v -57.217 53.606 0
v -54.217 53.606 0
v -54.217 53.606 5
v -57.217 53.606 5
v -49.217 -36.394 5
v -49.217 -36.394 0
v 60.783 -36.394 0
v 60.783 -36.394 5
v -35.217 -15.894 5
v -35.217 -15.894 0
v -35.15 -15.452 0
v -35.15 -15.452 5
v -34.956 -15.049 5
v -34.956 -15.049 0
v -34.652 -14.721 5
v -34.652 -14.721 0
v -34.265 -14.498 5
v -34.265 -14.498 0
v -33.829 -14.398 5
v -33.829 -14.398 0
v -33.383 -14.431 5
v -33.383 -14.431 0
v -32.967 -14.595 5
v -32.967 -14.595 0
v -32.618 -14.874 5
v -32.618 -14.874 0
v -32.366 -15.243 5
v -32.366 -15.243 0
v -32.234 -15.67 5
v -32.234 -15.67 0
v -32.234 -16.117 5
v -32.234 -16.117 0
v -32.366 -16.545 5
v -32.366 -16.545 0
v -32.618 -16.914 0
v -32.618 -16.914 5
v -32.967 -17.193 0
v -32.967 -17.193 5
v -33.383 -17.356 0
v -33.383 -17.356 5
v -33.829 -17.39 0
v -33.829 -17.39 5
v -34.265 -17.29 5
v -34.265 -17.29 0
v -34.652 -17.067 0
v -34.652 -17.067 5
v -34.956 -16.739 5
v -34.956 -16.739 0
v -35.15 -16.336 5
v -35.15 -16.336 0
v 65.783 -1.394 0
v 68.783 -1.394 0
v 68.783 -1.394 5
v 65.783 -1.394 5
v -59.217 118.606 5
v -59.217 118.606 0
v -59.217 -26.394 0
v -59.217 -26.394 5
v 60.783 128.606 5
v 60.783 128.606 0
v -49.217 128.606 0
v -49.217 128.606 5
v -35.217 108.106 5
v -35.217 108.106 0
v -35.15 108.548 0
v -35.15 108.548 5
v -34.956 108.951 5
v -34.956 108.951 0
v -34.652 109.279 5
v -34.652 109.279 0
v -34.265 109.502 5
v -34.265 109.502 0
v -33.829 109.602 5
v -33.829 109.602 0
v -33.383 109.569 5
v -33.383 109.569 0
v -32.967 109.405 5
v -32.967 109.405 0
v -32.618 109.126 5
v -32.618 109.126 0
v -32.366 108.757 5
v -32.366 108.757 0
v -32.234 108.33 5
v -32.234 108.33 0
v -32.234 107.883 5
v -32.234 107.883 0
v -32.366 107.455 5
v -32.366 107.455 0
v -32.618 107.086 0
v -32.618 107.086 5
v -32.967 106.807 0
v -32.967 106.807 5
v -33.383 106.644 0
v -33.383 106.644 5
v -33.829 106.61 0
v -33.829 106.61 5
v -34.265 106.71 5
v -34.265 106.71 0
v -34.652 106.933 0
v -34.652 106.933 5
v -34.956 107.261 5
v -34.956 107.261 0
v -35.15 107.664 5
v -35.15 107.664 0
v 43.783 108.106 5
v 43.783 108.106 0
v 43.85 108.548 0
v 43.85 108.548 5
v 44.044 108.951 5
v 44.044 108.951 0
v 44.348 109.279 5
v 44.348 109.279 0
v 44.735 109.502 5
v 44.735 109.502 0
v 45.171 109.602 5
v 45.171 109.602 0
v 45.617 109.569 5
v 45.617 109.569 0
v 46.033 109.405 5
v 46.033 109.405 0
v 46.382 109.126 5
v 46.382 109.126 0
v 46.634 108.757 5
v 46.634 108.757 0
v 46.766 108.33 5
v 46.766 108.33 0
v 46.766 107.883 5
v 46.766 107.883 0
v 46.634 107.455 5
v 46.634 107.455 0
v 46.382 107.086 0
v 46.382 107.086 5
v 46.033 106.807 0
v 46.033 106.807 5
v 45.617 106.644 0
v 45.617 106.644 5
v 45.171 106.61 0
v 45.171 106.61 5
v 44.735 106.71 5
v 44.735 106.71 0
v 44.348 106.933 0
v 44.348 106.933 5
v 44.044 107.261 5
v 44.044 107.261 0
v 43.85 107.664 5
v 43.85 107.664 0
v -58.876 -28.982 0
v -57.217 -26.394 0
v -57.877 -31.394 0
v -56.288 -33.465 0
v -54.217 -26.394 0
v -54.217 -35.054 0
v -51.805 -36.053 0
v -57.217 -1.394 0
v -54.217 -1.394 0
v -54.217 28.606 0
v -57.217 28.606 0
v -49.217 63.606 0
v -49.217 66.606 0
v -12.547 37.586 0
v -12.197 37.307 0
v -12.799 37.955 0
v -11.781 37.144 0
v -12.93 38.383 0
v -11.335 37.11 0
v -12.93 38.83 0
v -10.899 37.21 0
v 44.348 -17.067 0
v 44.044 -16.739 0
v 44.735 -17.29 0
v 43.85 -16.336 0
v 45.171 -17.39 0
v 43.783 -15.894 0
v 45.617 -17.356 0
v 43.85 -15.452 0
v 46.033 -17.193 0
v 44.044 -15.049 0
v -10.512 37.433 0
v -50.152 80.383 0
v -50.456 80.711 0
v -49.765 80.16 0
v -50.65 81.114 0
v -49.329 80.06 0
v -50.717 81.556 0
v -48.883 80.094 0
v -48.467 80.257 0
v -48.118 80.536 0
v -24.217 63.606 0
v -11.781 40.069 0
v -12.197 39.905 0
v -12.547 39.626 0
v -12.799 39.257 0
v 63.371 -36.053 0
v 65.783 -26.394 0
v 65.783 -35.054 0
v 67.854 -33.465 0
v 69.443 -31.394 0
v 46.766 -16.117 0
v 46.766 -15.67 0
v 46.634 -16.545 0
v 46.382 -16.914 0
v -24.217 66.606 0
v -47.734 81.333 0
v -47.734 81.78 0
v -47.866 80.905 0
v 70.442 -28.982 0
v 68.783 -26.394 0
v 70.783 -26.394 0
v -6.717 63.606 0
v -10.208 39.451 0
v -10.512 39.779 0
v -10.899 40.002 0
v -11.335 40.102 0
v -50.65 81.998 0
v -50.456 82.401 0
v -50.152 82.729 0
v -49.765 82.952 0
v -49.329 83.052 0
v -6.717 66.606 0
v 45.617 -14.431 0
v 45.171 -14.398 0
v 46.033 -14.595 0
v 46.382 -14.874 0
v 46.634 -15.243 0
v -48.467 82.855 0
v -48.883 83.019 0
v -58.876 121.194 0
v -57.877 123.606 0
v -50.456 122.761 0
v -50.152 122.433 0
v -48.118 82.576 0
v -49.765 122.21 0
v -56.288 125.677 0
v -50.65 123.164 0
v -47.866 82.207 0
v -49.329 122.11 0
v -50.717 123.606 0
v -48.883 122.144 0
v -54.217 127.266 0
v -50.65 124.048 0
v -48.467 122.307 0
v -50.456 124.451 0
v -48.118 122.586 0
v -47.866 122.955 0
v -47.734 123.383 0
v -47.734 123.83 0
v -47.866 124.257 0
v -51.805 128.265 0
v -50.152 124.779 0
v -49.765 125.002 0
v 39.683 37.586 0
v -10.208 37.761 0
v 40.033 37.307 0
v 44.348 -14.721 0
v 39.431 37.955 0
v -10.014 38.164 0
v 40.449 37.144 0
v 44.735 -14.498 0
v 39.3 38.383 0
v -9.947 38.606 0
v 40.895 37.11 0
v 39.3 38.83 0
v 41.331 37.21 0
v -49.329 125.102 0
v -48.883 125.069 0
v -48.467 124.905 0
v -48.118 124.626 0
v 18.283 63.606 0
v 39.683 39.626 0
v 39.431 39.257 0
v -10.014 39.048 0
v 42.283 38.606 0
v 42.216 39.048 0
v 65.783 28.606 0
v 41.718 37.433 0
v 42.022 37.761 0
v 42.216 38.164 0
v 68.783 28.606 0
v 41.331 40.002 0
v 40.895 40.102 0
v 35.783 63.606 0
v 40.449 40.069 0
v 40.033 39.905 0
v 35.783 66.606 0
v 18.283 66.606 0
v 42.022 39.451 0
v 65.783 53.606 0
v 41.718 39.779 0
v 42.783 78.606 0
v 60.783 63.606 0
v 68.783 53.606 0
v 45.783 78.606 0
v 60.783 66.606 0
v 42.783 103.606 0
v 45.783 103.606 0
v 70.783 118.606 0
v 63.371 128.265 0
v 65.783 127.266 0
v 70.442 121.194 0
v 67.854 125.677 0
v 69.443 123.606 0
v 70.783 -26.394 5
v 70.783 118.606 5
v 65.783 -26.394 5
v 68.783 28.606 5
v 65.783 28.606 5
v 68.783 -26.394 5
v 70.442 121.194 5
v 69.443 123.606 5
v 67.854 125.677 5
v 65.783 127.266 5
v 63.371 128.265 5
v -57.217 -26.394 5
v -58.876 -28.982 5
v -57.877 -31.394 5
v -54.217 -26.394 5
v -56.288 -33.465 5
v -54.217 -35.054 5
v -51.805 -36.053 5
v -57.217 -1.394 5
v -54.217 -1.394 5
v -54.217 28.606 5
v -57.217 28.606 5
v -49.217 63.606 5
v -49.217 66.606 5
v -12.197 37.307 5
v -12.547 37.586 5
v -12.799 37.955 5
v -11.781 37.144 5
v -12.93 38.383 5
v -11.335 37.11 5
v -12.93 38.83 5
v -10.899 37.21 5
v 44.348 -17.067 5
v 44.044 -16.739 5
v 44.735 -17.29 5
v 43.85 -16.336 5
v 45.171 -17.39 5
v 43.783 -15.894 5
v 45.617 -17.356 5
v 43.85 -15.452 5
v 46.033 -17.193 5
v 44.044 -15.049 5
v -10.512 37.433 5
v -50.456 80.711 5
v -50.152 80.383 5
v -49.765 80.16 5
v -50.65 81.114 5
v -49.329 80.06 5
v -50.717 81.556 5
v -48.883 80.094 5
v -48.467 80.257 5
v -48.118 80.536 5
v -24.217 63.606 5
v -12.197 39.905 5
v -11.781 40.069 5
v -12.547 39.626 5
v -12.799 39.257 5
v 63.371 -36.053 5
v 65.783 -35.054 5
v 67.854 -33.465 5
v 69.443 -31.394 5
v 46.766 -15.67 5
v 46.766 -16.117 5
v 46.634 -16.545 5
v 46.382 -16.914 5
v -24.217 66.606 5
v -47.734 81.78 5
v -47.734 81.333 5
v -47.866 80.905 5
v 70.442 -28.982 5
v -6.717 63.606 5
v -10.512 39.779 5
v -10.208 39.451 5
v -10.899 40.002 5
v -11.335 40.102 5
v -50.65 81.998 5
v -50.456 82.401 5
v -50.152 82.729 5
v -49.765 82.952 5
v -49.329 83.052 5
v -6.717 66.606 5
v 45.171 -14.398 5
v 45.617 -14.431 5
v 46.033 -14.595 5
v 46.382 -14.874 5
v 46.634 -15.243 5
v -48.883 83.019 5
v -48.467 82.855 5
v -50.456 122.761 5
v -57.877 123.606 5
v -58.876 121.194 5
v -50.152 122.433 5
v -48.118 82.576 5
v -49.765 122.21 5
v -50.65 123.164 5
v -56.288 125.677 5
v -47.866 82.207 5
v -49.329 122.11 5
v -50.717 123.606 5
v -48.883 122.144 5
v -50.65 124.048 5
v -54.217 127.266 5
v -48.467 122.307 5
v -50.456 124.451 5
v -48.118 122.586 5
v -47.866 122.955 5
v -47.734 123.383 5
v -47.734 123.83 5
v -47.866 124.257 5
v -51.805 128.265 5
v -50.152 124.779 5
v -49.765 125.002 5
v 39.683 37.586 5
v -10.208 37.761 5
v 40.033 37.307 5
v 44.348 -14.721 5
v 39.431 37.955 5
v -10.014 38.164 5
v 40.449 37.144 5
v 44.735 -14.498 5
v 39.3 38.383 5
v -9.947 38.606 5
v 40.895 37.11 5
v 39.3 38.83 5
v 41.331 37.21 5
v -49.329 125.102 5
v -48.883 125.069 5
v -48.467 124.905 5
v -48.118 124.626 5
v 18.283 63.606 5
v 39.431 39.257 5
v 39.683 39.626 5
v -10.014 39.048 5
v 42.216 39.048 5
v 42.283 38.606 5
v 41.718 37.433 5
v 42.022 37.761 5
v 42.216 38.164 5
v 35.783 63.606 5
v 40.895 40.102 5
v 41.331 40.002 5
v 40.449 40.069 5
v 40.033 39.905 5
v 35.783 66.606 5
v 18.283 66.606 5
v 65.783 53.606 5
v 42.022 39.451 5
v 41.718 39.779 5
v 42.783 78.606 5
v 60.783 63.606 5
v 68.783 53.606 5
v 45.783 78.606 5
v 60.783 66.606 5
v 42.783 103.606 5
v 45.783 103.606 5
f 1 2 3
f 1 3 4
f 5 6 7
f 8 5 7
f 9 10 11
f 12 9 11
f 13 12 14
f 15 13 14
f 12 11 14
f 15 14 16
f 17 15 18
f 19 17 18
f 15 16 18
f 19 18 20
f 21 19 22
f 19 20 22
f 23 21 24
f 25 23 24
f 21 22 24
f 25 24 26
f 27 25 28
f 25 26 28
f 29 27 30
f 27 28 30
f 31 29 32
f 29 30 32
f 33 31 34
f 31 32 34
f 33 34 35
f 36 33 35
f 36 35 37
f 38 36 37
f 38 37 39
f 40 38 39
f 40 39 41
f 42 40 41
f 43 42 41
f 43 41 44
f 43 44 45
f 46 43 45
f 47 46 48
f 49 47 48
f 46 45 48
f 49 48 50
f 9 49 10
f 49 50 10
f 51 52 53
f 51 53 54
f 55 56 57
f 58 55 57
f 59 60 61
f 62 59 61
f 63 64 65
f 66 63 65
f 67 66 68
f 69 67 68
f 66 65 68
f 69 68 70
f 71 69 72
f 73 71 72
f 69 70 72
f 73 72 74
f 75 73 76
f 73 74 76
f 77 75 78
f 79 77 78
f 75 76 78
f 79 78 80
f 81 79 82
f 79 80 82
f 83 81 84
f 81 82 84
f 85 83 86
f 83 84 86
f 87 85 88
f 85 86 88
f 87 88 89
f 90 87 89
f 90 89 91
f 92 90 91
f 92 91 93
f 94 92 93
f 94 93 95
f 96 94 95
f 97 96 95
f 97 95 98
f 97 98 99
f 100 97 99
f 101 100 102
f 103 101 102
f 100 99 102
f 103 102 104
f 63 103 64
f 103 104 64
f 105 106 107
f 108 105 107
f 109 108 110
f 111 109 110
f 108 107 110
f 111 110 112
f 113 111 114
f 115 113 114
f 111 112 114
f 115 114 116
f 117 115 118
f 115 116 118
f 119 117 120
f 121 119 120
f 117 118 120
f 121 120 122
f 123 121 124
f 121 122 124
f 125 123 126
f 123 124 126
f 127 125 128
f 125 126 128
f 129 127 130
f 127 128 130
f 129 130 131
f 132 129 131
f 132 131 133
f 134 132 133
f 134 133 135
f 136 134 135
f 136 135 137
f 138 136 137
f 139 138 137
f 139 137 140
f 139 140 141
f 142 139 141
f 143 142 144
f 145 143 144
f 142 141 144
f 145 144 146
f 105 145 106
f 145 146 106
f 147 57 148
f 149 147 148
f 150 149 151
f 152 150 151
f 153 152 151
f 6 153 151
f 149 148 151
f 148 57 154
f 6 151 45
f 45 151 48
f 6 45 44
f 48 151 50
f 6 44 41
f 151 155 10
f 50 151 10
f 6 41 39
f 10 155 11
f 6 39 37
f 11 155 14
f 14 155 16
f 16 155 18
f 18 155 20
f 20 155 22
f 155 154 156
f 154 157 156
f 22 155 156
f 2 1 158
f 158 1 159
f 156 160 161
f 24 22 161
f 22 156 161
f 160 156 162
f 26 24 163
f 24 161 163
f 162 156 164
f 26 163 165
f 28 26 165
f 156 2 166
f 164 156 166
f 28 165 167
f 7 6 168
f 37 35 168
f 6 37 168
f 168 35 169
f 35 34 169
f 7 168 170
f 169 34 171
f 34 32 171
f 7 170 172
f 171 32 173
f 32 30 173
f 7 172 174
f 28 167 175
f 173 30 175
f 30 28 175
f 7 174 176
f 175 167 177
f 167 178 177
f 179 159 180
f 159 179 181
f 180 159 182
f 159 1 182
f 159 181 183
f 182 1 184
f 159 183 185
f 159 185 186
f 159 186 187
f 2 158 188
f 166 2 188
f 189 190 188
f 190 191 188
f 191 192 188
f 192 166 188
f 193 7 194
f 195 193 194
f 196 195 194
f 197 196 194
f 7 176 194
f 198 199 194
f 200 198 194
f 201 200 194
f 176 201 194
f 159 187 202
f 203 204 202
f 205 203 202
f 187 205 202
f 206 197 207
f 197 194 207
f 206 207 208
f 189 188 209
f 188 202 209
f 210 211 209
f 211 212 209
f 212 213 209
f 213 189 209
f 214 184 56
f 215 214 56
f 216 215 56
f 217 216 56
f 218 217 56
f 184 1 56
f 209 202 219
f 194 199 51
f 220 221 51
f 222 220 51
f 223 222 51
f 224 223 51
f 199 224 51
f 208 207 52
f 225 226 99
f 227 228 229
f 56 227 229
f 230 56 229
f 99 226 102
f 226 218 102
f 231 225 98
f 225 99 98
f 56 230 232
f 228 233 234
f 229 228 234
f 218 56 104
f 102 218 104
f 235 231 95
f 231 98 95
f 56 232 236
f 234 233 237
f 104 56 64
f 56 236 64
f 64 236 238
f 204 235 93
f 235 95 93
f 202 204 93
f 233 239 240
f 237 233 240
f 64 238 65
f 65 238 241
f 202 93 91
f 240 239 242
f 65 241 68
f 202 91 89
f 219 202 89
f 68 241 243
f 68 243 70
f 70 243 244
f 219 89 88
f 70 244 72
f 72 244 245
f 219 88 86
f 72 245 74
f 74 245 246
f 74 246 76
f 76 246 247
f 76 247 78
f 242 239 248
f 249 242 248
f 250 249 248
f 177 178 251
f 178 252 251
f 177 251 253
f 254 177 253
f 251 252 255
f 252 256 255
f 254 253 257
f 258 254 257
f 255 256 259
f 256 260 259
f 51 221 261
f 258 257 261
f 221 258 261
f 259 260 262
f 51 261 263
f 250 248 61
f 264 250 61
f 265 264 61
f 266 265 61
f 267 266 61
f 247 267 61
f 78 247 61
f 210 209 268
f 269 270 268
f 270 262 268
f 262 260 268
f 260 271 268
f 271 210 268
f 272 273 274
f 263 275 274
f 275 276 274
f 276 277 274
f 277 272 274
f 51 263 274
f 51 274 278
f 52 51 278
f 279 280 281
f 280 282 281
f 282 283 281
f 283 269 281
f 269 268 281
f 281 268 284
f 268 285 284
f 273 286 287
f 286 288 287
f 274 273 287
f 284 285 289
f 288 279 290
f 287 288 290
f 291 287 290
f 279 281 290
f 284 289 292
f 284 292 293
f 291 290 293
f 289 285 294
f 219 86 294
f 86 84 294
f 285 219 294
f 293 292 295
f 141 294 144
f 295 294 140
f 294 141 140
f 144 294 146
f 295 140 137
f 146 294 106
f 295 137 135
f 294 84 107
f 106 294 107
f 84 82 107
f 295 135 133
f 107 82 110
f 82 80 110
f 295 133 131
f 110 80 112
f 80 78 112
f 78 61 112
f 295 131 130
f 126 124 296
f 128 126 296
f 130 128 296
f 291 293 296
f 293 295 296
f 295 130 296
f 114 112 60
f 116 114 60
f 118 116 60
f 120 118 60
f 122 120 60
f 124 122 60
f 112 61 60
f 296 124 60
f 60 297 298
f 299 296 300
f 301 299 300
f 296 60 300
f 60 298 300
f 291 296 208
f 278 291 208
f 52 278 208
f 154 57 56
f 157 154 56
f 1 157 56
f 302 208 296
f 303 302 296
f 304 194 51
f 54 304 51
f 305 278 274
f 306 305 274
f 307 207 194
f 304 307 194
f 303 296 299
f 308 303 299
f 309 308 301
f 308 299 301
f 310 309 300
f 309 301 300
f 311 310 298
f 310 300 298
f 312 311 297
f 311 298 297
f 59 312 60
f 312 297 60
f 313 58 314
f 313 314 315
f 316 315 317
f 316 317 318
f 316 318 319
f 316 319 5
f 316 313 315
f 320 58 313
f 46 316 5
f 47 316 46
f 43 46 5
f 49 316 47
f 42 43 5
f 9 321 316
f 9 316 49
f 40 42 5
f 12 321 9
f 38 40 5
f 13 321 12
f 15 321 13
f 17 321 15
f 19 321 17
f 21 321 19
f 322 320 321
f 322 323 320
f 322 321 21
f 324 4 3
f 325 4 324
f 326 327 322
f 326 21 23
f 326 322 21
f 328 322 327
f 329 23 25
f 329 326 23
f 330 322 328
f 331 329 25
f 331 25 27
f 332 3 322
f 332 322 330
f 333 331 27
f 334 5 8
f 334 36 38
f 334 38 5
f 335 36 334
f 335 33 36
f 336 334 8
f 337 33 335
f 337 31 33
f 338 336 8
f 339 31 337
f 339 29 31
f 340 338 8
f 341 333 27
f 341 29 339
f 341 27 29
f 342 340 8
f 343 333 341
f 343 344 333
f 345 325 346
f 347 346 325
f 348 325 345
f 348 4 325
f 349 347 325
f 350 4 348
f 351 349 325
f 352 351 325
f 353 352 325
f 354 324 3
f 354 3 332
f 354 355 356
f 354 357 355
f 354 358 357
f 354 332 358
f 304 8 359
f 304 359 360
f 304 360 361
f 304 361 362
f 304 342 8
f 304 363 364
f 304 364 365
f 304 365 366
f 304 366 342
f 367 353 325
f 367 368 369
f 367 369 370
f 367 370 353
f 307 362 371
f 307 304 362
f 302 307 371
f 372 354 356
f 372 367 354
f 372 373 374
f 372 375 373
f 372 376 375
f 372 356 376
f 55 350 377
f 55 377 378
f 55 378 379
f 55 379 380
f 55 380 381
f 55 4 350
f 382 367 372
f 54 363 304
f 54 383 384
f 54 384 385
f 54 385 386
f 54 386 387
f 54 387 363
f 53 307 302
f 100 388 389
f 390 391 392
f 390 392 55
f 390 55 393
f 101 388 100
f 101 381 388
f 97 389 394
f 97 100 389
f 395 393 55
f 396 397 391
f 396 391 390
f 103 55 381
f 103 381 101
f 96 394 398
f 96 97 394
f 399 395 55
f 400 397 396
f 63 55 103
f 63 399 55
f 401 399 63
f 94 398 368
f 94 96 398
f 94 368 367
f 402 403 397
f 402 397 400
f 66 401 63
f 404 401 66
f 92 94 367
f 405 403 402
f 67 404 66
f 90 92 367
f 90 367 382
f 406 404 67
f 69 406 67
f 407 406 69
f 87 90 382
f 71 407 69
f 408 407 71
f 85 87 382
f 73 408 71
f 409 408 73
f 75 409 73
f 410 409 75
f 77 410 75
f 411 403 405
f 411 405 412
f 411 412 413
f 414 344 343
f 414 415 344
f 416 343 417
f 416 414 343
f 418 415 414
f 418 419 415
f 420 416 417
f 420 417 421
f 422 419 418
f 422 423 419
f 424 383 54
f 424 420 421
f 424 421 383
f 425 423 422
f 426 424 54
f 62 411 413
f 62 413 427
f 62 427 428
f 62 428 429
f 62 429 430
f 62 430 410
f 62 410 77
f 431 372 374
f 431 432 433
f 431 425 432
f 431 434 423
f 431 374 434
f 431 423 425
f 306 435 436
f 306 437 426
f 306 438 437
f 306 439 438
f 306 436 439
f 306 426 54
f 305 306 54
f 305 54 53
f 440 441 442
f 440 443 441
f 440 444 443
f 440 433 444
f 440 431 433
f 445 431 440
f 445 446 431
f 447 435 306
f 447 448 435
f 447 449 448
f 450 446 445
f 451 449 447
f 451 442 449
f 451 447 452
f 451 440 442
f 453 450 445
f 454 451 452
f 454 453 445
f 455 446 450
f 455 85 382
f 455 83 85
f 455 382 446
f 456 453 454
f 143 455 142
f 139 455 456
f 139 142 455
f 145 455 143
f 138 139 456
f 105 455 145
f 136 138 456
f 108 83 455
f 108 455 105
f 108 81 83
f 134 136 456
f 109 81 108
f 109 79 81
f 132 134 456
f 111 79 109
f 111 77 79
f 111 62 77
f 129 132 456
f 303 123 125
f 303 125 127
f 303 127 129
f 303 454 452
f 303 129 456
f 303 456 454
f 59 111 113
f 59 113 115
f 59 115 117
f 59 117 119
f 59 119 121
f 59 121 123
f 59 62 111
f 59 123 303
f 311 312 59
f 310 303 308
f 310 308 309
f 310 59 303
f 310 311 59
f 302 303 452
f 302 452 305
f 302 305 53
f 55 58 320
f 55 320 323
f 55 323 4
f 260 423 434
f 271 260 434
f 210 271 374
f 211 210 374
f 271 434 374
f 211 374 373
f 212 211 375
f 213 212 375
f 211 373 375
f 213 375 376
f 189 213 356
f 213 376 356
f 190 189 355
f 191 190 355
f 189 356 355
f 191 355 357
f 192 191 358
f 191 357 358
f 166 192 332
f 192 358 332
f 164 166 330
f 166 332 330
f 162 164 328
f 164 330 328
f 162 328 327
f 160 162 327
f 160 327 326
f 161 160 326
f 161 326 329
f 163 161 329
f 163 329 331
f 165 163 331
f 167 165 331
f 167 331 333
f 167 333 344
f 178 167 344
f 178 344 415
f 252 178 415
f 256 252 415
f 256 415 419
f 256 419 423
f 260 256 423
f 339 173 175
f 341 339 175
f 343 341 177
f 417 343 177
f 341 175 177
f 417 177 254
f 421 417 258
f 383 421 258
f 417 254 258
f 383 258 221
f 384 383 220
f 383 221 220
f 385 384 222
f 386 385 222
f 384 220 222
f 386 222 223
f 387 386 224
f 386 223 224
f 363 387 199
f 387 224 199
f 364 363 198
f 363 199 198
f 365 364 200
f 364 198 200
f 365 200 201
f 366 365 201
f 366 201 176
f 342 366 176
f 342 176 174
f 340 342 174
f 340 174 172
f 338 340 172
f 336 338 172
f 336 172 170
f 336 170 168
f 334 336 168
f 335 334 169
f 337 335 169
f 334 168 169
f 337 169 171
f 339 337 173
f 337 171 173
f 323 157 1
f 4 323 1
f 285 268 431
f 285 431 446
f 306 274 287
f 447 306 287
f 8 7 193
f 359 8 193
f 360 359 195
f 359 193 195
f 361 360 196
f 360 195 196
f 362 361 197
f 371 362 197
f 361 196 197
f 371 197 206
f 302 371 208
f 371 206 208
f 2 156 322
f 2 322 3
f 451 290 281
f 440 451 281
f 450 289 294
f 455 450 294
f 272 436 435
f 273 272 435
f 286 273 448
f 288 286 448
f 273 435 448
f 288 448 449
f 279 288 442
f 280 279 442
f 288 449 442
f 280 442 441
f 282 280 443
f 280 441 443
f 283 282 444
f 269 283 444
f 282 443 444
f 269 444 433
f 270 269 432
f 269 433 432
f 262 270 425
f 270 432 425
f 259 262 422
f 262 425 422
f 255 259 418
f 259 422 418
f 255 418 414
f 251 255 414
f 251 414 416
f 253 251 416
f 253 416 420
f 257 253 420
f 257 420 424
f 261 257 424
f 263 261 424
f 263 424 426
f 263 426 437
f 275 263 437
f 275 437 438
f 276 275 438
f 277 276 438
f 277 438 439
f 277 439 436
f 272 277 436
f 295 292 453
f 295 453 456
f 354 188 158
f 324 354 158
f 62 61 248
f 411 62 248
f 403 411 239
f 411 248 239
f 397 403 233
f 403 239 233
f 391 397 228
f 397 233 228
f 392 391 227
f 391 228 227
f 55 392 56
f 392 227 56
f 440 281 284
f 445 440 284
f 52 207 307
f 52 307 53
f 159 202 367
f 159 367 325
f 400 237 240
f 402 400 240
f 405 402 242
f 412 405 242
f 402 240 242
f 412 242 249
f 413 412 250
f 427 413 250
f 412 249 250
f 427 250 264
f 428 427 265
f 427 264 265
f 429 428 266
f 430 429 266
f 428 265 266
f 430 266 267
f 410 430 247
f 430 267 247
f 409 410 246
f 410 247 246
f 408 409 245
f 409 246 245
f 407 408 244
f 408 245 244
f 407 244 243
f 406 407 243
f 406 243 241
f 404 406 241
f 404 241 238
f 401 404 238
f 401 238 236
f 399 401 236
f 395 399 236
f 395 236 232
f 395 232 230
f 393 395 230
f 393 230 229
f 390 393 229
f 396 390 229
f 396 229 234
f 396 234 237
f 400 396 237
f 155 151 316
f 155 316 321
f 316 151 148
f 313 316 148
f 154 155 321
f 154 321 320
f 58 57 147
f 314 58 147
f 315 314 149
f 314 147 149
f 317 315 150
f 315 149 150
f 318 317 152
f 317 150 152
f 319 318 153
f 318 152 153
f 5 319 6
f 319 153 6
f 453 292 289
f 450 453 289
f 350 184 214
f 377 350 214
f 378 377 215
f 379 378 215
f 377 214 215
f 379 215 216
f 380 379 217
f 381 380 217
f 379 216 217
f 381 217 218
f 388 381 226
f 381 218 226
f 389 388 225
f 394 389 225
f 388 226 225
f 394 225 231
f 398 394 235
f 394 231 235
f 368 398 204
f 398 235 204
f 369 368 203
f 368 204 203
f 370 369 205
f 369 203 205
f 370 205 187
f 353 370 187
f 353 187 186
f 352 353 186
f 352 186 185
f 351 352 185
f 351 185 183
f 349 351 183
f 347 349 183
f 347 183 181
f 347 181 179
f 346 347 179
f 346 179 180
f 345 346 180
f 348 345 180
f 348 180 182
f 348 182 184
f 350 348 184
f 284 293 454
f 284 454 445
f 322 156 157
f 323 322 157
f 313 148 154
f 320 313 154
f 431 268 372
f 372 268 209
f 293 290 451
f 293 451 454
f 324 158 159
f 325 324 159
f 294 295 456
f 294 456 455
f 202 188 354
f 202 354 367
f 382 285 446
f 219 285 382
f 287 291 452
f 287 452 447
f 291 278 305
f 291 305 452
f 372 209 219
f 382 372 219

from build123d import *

# Parameters (mm, degrees)
RESSALTO_EXTRUS_O1_DEPTH = 5
ESBO_O2_R                = 1.5
CORTE_EXTRUS_O1_DEPTH    = 5
ESBO_O3_R                = 1.5
CORTE_EXTRUS_O2_DEPTH    = 6
ESBO_O6_W                = 3
ESBO_O6_H                = 25
ESBO_O6_W_2              = 25
ESBO_O6_H_2              = 3
CORTE_EXTRUS_O4_DEPTH    = 6
ESBO_O8_R                = 1.5
CORTE_EXTRUS_O6_DEPTH    = 10
ESBO_O9_W                = 3
ESBO_O9_H                = 25
CORTE_EXTRUS_O7_DEPTH    = 10


with BuildPart() as part:
    # Esboço1 → Ressalto-extrusão1 (new body)
    with BuildSketch(Plane.XY):
        with BuildLine():
            Line((-49.217119449, -36.393854661), (60.782880551, -36.393854661))
            ThreePointArc((60.782880551, -36.393854661), (67.853948363, -33.464922473), (70.782880551, -26.393854661))
            Line((70.782880551, -26.393854661), (70.782880551, 118.606145339))
            ThreePointArc((70.782880551, 118.606145339), (67.853948363, 125.67721315), (60.782880551, 128.606145339))
            Line((60.782880551, 128.606145339), (-49.217119449, 128.606145339))
            ThreePointArc((-49.217119449, 128.606145339), (-56.288187261, 125.67721315), (-59.217119449, 118.606145339))
            Line((-59.217119449, 118.606145339), (-59.217119449, -26.393854661))
            ThreePointArc((-59.217119449, -26.393854661), (-56.288187261, -33.464922473), (-49.217119449, -36.393854661))
        make_face()
    extrude(amount=RESSALTO_EXTRUS_O1_DEPTH)

    # Esboço2 → Corte-extrusão1 (cut)
    with BuildSketch(Plane(origin=(0, 0, 0), x_dir=(-1, 0, 0), z_dir=(0, 0, -1))):
        with Locations((33.717119449, -15.893854661)):
            Circle(ESBO_O2_R)
        with Locations((33.717119449, 108.106145339)):
            Circle(ESBO_O2_R)
        with Locations((-45.282880551, -15.893854661)):
            Circle(ESBO_O2_R)
        with Locations((-45.282880551, 108.106145339)):
            Circle(ESBO_O2_R)
    extrude(amount=-CORTE_EXTRUS_O1_DEPTH, mode=Mode.SUBTRACT)

    # Esboço3 → Corte-extrusão2 (cut, through all)
    with BuildSketch(Plane(origin=(0, 0, 0), x_dir=(-1, 0, 0), z_dir=(0, 0, -1))):
        with Locations((49.217119449, 123.606145339)):
            Circle(ESBO_O3_R)
        with Locations((49.217119449, 81.556145339)):
            Circle(ESBO_O3_R)
    extrude(amount=-CORTE_EXTRUS_O2_DEPTH, mode=Mode.SUBTRACT)

    # Esboço6 → Corte-extrusão4 (cut, through all)
    with BuildSketch(Plane(origin=(0, 0, 0), x_dir=(-1, 0, 0), z_dir=(0, 0, -1))):
        with Locations((-67.282880551, -13.893854661)):
            Rectangle(ESBO_O6_W, ESBO_O6_H)
        with Locations((-67.282880551, 41.106145339)):
            Rectangle(ESBO_O6_W, ESBO_O6_H)
        with Locations((-48.282880551, 65.106145339)):
            Rectangle(ESBO_O6_W_2, ESBO_O6_H_2)
        with Locations((36.717119449, 65.106145339)):
            Rectangle(ESBO_O6_W_2, ESBO_O6_H_2)
        with Locations((55.717119449, 41.106145339)):
            Rectangle(ESBO_O6_W, ESBO_O6_H)
        with Locations((55.717119449, -13.893854661)):
            Rectangle(ESBO_O6_W, ESBO_O6_H)
        with Locations((-5.782880551, 65.106145339)):
            Rectangle(ESBO_O6_W_2, ESBO_O6_H_2)
    extrude(amount=-CORTE_EXTRUS_O4_DEPTH, mode=Mode.SUBTRACT)

    # Esboço8 → Corte-extrusão6 (cut)
    with BuildSketch(Plane.XY.offset(5)):
        with Locations((-11.447119449, 38.606145339)):
            Circle(ESBO_O8_R)
        with Locations((40.782880551, 38.606145339)):
            Circle(ESBO_O8_R)
    extrude(amount=-CORTE_EXTRUS_O6_DEPTH, mode=Mode.SUBTRACT)

    # Esboço9 → Corte-extrusão7 (cut)
    with BuildSketch(Plane(origin=(0, 0, 0), x_dir=(-1, 0, 0), z_dir=(0, 0, -1))):
        with Locations((-44.282880551, 91.106145339)):
            Rectangle(ESBO_O9_W, ESBO_O9_H)
    extrude(amount=-CORTE_EXTRUS_O7_DEPTH, mode=Mode.SUBTRACT)


solid = part.part
